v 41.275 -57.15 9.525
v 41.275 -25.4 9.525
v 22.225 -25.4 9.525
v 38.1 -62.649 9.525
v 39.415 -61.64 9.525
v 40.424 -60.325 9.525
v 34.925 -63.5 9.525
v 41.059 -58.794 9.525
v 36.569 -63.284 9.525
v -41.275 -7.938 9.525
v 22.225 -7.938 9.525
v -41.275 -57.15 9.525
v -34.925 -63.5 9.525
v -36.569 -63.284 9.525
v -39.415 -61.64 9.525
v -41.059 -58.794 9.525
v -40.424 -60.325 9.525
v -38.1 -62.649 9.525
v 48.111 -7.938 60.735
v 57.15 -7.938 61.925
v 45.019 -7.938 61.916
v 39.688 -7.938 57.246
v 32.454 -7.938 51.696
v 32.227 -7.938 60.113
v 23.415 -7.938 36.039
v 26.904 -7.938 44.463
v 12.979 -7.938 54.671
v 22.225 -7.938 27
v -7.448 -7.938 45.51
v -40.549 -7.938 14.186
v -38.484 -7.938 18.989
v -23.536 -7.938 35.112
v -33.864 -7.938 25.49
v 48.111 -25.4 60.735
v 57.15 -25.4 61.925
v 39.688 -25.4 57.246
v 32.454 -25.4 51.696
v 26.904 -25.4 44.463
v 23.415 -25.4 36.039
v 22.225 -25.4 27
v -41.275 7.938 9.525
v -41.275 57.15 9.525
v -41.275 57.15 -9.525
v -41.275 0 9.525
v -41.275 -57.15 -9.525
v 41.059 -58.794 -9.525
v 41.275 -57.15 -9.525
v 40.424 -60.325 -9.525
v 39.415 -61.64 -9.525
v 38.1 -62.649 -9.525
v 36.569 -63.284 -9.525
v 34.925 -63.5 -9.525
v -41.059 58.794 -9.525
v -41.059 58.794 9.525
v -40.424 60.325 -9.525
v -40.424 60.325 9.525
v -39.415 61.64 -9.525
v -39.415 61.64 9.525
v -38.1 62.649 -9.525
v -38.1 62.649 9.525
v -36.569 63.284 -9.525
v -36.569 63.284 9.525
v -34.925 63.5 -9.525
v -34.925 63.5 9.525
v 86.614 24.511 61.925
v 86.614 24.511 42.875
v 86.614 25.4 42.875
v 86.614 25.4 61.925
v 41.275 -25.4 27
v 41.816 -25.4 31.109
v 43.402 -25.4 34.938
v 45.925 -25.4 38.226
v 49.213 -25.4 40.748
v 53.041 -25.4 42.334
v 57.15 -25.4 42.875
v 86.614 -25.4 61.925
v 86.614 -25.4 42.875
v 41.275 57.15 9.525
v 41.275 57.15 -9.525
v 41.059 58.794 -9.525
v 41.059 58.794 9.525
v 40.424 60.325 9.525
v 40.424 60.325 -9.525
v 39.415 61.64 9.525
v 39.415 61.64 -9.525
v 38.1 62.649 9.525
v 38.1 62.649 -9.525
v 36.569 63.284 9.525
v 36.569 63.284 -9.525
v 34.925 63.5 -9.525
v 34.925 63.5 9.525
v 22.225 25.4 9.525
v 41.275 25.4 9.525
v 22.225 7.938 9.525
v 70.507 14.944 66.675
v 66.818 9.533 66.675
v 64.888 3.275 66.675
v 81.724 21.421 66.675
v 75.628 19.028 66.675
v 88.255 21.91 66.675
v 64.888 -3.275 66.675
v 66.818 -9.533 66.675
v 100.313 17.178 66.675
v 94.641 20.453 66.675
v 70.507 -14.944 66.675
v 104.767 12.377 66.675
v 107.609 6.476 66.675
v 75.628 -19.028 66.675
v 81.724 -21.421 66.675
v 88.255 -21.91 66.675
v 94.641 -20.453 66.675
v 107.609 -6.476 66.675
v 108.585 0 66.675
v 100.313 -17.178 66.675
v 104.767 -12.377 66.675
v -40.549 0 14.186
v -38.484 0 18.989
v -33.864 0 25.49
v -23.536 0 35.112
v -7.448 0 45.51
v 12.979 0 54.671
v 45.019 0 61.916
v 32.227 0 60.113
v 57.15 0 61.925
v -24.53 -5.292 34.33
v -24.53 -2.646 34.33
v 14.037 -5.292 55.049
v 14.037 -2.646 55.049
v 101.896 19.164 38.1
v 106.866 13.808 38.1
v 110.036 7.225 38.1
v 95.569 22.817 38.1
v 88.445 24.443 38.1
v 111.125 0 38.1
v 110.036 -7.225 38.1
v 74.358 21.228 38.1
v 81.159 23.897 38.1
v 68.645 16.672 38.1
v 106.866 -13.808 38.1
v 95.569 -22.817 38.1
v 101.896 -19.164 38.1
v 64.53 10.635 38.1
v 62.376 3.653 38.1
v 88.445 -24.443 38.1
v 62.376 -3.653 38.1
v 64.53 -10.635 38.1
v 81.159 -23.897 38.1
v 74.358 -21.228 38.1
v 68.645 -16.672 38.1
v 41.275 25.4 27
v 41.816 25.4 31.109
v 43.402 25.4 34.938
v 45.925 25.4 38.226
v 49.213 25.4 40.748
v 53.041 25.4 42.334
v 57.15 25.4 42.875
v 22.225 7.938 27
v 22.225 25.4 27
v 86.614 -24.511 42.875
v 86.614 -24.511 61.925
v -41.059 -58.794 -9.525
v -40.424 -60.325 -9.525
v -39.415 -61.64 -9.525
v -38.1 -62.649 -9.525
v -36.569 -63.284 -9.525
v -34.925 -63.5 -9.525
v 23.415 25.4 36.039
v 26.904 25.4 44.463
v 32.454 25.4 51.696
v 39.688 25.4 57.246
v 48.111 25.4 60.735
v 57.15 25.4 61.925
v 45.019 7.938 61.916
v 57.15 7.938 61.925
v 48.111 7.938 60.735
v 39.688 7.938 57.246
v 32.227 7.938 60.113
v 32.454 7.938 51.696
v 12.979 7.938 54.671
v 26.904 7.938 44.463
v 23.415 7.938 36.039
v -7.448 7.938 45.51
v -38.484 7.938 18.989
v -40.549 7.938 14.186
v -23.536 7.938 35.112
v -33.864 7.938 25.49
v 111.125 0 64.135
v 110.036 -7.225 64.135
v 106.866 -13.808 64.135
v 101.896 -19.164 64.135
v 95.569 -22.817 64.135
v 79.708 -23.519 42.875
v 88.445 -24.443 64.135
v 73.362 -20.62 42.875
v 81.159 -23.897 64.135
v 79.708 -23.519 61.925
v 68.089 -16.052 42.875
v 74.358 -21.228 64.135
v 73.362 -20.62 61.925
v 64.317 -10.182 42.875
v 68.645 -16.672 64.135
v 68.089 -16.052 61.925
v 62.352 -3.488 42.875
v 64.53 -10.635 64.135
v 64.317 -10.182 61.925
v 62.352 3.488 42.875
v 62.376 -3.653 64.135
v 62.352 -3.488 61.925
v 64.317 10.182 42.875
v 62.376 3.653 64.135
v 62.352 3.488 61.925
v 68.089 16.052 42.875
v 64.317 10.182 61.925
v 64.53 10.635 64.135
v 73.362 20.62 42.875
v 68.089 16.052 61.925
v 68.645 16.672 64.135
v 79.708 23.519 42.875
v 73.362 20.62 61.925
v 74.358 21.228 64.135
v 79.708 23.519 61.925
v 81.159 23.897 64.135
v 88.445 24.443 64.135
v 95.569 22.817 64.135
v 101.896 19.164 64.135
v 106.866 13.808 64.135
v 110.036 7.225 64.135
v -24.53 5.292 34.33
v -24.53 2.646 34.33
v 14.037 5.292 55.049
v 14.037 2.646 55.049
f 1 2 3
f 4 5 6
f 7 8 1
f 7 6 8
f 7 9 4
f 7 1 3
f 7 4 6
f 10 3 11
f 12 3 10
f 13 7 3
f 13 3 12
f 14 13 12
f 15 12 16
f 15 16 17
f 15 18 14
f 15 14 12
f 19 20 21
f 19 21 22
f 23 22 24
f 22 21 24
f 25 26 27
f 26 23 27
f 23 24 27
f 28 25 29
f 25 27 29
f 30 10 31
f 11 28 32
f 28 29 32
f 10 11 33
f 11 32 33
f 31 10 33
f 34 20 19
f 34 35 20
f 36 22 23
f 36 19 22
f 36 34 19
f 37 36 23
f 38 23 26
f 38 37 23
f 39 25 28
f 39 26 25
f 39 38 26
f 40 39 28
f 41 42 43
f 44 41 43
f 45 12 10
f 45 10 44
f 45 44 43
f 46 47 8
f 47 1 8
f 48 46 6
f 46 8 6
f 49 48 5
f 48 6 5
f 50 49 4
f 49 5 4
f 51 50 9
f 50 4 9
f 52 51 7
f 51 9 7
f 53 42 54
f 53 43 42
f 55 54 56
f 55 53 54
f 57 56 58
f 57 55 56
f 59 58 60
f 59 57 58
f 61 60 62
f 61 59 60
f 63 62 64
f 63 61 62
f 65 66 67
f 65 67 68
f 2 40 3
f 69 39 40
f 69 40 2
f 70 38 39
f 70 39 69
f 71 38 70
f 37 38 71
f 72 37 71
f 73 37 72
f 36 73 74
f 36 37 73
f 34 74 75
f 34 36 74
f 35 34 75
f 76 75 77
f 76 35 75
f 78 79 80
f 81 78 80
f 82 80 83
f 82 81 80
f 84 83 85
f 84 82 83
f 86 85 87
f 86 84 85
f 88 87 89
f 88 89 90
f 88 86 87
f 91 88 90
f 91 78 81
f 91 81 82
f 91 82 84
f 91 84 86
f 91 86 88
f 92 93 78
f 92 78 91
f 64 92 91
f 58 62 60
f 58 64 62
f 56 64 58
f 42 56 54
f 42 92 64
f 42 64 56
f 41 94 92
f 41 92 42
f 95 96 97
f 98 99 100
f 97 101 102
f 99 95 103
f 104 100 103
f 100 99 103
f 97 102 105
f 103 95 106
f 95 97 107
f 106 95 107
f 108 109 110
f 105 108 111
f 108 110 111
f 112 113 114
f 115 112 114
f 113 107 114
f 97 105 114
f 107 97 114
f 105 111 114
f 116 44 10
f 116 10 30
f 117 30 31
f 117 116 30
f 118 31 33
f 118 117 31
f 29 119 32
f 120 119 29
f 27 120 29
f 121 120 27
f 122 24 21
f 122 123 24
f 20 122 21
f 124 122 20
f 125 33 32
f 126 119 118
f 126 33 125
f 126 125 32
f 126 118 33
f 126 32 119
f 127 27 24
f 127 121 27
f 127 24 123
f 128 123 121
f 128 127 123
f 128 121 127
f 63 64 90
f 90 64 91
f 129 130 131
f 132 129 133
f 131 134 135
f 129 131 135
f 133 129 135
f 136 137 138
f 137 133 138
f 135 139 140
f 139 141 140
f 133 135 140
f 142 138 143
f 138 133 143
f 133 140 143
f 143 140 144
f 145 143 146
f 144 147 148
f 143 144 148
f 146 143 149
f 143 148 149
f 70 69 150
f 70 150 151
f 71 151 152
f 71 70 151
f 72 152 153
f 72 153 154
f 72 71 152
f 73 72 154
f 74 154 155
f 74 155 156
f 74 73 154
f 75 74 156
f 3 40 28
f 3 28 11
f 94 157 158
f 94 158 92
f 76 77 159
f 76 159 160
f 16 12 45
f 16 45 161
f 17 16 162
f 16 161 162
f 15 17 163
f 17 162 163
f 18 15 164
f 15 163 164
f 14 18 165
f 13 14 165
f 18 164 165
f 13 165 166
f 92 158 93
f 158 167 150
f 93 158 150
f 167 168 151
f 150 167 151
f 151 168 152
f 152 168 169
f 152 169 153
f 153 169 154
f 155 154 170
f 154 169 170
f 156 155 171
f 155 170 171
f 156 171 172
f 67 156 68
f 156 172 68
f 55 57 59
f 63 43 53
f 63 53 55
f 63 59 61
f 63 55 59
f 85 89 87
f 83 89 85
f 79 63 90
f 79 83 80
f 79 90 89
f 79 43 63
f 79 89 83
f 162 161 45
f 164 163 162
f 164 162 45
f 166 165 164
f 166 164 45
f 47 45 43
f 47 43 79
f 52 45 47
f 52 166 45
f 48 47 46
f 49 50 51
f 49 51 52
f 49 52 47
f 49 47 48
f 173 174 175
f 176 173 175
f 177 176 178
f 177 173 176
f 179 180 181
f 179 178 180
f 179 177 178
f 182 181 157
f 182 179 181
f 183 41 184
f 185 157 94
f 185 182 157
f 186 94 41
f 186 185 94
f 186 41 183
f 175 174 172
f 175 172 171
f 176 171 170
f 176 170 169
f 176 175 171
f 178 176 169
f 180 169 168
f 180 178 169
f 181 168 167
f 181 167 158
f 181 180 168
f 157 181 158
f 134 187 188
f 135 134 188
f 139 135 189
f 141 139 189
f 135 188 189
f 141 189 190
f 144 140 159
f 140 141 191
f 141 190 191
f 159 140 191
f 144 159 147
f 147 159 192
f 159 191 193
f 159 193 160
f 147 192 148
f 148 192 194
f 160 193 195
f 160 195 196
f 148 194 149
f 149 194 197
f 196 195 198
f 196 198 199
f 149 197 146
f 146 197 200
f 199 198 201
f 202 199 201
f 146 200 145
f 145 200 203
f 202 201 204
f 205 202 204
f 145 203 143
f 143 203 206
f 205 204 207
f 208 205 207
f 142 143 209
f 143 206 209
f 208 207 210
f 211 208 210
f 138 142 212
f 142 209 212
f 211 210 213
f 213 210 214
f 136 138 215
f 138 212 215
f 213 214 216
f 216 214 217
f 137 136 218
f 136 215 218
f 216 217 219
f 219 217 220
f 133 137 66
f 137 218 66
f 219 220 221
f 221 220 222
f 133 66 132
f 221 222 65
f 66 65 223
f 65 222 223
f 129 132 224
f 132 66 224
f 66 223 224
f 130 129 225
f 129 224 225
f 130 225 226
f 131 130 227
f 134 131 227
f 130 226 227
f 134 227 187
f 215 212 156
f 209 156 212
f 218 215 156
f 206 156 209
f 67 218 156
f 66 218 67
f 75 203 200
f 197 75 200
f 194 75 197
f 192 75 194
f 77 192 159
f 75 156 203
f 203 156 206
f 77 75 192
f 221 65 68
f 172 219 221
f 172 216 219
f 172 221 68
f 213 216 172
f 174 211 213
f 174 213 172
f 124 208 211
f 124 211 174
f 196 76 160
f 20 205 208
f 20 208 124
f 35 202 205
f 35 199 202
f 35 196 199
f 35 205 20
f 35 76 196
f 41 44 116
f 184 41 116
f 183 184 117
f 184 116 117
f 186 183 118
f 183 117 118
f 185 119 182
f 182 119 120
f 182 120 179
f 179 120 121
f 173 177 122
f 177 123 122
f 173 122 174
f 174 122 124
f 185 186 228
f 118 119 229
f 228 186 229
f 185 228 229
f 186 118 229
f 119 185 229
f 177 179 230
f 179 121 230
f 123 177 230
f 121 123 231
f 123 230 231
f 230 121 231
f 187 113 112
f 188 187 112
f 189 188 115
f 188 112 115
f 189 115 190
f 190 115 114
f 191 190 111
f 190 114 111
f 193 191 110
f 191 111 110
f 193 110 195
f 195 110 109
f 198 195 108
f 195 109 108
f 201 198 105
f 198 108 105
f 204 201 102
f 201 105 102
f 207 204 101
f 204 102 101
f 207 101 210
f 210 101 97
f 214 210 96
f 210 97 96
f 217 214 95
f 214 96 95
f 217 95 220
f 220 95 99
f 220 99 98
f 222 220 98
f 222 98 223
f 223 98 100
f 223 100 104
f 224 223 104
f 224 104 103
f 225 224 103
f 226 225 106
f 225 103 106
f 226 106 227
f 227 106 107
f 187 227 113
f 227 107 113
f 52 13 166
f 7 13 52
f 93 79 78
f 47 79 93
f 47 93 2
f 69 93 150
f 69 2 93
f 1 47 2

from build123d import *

# Parameters (mm, degrees)
F1_DEPTH = 63.5
F2_DEPTH = 25.4
F3_DEPTH = 7.9375
F5_R     = 6.35
F6_SIZE  = 2.54


with BuildPart() as f1:
    # F0 (on Front) → F1 (new body, symmetric)
    with BuildSketch(Plane.XZ):
        Polygon((22.225, 9.525), (-41.275, 9.525), (-41.275, -9.525), (41.275, -9.525), (41.275, 9.525), align=None)
    extrude(amount=F1_DEPTH, both=True)

    # F0 (on Front) → F2 (join, symmetric)
    with BuildSketch(Plane.XZ):
        with BuildLine():
            Line((22.225, 27.0002), (22.225, 9.525))
            Line((22.225, 9.525), (41.275, 9.525))
            Line((41.275, 9.525), (41.275, 27.0002))
            ThreePointArc((41.275, 27.0002), (45.9246798487, 38.2255201513), (57.15, 42.8752))
            Line((57.15, 42.8752), (60.325, 42.8752))
            Line((60.325, 42.8752), (60.325, 61.9252))
            Line((60.325, 61.9252), (57.15, 61.9252))
            ThreePointArc((57.15, 61.9252), (32.4542956671, 51.6959043329), (22.225, 27.0002))
        make_face()
        Polygon((86.6135649812, 61.9252), (60.325, 61.9252), (60.325, 42.8752), (76.2353741971, 42.8752), (86.6135649812, 42.8752), align=None)
    extrude(amount=F2_DEPTH, both=True)

    # F0 (on Front) → F3 (join, symmetric)
    with BuildSketch(Plane.XZ):
        with BuildLine():
            add(Edge.make_bspline(
                [(-41.275, 9.525), (-41.1990918219, 33.1209041178), (17.5218340009, 65.2216747403), (57.15, 61.9252)],
                knots=[0, 0, 0, 0, 111.5045361635, 111.5045361635, 111.5045361635, 111.5045361635], degree=3))
            Line((-41.275, 9.525), (22.225, 9.525))
            Line((22.225, 9.525), (22.225, 27.0002))
            ThreePointArc((22.225, 27.0002), (32.4542956671, 51.6959043329), (57.15, 61.9252))
        make_face()
    extrude(amount=F3_DEPTH, both=True)

    # F0 (on Front) → F4 (revolve)
    with BuildSketch(Plane.XZ):
        Polygon((86.6135649812, 66.675), (86.6135649812, 61.9252), (86.6135649812, 42.8752), (86.6135649812, 38.1), (111.125, 38.1), (111.125, 66.675), align=None)
    revolve(axis=Axis((86.6135649812, 0, 52.3875), (0, 0, -1)))

    # F5
    f5_edges = [f1.edges().sort_by_distance(p)[0] for p in [
        (-41.275, -63.5, 0),
        (41.275, -63.5, 0),
        (41.275, 63.5, 0),
        (-41.275, 63.5, 0),
    ]]
    fillet(f5_edges, radius=F5_R)

    # F6
    f6_edges = [f1.edges().sort_by_distance(p)[0] for p in [
        (62.10213, 0, 66.675),
    ]]
    chamfer(f6_edges, length=F6_SIZE)


solid = f1.part
